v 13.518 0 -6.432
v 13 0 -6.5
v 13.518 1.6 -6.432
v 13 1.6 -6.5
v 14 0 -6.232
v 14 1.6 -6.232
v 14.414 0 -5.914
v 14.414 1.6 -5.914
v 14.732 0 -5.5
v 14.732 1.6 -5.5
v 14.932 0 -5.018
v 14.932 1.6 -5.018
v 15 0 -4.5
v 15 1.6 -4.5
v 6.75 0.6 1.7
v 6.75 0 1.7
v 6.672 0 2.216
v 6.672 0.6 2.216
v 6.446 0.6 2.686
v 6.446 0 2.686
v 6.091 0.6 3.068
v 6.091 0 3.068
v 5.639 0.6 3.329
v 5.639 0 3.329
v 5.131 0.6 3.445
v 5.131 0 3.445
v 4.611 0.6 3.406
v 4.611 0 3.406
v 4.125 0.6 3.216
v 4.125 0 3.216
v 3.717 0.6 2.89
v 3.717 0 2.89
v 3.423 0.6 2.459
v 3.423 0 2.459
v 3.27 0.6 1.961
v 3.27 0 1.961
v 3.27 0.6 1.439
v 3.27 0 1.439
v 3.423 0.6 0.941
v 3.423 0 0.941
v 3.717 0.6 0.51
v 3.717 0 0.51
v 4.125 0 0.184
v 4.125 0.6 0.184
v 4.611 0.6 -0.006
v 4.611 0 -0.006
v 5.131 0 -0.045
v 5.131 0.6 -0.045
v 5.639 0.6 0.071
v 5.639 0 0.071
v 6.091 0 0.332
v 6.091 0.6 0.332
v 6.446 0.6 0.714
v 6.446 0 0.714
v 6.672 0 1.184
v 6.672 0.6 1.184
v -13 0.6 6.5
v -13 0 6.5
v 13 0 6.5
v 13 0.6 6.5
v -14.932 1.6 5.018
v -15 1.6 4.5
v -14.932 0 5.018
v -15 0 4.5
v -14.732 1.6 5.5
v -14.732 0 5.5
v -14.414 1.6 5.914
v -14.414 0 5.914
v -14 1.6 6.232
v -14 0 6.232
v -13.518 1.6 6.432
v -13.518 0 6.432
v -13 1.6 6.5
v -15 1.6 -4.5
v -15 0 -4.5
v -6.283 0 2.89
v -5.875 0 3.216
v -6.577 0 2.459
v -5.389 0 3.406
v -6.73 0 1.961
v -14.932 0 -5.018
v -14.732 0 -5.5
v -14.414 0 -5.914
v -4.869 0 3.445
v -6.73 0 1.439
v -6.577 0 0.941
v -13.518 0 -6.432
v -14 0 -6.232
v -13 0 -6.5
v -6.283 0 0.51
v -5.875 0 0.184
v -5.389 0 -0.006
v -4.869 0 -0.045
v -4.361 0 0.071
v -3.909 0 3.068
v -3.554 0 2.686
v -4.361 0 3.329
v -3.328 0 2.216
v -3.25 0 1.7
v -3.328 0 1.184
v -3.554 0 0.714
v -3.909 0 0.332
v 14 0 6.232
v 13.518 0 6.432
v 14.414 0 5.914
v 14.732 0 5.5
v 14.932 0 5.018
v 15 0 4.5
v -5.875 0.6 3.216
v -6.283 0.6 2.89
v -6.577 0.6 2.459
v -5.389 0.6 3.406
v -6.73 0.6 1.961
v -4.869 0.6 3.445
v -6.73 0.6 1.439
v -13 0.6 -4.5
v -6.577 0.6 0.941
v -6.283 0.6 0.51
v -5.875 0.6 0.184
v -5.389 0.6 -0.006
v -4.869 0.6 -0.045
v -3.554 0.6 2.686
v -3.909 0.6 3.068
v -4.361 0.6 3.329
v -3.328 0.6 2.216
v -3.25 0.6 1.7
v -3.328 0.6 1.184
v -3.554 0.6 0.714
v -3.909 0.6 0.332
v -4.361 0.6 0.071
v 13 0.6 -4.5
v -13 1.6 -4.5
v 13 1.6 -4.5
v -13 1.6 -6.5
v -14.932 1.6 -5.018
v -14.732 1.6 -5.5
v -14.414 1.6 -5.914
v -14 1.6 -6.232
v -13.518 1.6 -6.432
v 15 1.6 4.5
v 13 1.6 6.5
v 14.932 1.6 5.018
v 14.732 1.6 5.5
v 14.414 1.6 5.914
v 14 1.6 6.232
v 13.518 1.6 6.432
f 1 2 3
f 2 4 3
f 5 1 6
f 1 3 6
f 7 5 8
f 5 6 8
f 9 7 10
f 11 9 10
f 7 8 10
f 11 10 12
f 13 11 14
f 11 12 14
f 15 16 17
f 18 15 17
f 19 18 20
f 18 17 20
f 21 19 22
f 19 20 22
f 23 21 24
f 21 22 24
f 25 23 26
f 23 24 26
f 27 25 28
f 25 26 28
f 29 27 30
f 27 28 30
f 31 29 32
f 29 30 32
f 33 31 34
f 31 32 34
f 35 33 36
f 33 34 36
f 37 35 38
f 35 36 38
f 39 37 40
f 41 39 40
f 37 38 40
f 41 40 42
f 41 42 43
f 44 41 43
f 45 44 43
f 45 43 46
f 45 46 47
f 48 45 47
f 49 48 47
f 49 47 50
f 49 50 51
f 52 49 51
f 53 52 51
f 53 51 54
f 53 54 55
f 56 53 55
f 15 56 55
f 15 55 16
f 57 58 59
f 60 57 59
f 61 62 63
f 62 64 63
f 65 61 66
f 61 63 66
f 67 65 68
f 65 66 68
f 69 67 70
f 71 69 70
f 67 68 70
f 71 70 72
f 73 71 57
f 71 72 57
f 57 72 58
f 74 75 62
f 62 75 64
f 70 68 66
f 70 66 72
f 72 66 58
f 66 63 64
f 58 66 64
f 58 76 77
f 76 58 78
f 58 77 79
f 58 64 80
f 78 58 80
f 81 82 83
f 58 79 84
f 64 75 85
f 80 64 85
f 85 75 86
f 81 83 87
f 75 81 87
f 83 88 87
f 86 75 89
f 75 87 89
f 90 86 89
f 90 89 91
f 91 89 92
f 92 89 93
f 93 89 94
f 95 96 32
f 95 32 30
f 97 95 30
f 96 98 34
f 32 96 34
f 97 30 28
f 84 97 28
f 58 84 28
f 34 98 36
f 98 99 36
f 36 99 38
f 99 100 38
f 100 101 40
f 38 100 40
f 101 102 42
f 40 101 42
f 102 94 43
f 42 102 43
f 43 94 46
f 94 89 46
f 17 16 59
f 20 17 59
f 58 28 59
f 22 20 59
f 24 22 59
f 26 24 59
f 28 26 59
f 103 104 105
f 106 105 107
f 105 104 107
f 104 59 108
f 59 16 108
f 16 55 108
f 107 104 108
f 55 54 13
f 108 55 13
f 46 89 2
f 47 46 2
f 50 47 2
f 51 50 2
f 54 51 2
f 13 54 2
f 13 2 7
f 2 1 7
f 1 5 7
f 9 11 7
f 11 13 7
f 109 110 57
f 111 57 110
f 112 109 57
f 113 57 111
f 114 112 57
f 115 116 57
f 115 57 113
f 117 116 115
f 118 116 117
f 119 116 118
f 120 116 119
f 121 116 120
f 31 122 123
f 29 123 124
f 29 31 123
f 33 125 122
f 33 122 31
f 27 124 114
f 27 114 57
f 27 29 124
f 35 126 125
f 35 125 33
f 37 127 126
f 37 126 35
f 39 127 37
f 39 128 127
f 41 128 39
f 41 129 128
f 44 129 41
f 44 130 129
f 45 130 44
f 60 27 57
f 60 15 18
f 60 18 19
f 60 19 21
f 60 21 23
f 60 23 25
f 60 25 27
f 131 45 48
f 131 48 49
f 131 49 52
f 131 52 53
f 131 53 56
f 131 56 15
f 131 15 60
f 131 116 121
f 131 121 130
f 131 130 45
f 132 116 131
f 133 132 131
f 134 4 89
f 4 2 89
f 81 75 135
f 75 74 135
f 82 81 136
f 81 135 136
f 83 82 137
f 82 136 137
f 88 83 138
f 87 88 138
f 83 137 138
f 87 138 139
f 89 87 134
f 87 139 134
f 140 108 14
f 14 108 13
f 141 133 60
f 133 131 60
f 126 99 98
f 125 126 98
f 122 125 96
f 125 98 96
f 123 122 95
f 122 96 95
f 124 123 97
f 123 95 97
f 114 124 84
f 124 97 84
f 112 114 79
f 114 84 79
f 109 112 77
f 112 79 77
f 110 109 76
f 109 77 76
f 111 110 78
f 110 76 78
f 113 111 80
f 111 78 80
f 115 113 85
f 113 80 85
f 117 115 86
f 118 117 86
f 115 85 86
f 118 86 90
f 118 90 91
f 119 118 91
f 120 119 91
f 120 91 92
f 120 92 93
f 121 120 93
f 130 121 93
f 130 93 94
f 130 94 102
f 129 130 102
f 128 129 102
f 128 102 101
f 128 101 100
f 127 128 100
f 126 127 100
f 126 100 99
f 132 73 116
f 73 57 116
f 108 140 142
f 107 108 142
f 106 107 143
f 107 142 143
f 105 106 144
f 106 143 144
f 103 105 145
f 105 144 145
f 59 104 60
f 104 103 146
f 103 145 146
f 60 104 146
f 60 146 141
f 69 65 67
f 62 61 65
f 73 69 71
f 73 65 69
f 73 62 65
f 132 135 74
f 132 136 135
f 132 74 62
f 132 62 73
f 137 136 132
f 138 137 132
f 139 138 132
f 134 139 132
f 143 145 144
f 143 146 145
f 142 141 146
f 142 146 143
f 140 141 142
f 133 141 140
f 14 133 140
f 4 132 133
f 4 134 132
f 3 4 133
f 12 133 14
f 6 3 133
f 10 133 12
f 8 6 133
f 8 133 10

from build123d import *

# Parameters (mm, degrees)
SKETCH1_W           = 30
SKETCH1_H           = 13
BOSS_EXTRUDE1_DEPTH = 0.6
BOSS_EXTRUDE2_DEPTH = 1
FILLET1_R           = 2
SKETCH3_R           = 1.75
CUT_EXTRUDE1_DEPTH  = 2.6


with BuildPart() as part:
    # Sketch1 → Boss-Extrude1 (new body)
    with BuildSketch(Plane(origin=(0, 0, 0), x_dir=(1, 0, 0), z_dir=(0, 1, 0))):
        Rectangle(SKETCH1_W, SKETCH1_H)
    extrude(amount=BOSS_EXTRUDE1_DEPTH)

    # Sketch2 → Boss-Extrude2 (add)
    with BuildSketch(Plane(origin=(0, 0.6, 0), x_dir=(1, 0, 0), z_dir=(0, 1, 0))):
        Polygon((-13, 4.5), (13, 4.5), (13, -6.5), (15, -6.5), (15, 6.5), (-15, 6.5), (-15, -6.5), (-13, -6.5), align=None)
    extrude(amount=BOSS_EXTRUDE2_DEPTH)

    # Fillet1
    fillet1_edges = [part.edges().sort_by_distance(p)[0] for p in [
        (-15, 0.8, 6.5),
        (15, 0.8, 6.5),
        (15, 0.8, -6.5),
        (-15, 0.8, -6.5),
    ]]
    fillet(fillet1_edges, radius=FILLET1_R)

    # Sketch3 → Cut-Extrude1 (cut, through all)
    with BuildSketch(Plane.XZ):
        with Locations((-5, 1.7)):
            Circle(SKETCH3_R)
        with Locations((5, 1.7)):
            Circle(SKETCH3_R)
    extrude(amount=-CUT_EXTRUDE1_DEPTH, mode=Mode.SUBTRACT)


solid = part.part
